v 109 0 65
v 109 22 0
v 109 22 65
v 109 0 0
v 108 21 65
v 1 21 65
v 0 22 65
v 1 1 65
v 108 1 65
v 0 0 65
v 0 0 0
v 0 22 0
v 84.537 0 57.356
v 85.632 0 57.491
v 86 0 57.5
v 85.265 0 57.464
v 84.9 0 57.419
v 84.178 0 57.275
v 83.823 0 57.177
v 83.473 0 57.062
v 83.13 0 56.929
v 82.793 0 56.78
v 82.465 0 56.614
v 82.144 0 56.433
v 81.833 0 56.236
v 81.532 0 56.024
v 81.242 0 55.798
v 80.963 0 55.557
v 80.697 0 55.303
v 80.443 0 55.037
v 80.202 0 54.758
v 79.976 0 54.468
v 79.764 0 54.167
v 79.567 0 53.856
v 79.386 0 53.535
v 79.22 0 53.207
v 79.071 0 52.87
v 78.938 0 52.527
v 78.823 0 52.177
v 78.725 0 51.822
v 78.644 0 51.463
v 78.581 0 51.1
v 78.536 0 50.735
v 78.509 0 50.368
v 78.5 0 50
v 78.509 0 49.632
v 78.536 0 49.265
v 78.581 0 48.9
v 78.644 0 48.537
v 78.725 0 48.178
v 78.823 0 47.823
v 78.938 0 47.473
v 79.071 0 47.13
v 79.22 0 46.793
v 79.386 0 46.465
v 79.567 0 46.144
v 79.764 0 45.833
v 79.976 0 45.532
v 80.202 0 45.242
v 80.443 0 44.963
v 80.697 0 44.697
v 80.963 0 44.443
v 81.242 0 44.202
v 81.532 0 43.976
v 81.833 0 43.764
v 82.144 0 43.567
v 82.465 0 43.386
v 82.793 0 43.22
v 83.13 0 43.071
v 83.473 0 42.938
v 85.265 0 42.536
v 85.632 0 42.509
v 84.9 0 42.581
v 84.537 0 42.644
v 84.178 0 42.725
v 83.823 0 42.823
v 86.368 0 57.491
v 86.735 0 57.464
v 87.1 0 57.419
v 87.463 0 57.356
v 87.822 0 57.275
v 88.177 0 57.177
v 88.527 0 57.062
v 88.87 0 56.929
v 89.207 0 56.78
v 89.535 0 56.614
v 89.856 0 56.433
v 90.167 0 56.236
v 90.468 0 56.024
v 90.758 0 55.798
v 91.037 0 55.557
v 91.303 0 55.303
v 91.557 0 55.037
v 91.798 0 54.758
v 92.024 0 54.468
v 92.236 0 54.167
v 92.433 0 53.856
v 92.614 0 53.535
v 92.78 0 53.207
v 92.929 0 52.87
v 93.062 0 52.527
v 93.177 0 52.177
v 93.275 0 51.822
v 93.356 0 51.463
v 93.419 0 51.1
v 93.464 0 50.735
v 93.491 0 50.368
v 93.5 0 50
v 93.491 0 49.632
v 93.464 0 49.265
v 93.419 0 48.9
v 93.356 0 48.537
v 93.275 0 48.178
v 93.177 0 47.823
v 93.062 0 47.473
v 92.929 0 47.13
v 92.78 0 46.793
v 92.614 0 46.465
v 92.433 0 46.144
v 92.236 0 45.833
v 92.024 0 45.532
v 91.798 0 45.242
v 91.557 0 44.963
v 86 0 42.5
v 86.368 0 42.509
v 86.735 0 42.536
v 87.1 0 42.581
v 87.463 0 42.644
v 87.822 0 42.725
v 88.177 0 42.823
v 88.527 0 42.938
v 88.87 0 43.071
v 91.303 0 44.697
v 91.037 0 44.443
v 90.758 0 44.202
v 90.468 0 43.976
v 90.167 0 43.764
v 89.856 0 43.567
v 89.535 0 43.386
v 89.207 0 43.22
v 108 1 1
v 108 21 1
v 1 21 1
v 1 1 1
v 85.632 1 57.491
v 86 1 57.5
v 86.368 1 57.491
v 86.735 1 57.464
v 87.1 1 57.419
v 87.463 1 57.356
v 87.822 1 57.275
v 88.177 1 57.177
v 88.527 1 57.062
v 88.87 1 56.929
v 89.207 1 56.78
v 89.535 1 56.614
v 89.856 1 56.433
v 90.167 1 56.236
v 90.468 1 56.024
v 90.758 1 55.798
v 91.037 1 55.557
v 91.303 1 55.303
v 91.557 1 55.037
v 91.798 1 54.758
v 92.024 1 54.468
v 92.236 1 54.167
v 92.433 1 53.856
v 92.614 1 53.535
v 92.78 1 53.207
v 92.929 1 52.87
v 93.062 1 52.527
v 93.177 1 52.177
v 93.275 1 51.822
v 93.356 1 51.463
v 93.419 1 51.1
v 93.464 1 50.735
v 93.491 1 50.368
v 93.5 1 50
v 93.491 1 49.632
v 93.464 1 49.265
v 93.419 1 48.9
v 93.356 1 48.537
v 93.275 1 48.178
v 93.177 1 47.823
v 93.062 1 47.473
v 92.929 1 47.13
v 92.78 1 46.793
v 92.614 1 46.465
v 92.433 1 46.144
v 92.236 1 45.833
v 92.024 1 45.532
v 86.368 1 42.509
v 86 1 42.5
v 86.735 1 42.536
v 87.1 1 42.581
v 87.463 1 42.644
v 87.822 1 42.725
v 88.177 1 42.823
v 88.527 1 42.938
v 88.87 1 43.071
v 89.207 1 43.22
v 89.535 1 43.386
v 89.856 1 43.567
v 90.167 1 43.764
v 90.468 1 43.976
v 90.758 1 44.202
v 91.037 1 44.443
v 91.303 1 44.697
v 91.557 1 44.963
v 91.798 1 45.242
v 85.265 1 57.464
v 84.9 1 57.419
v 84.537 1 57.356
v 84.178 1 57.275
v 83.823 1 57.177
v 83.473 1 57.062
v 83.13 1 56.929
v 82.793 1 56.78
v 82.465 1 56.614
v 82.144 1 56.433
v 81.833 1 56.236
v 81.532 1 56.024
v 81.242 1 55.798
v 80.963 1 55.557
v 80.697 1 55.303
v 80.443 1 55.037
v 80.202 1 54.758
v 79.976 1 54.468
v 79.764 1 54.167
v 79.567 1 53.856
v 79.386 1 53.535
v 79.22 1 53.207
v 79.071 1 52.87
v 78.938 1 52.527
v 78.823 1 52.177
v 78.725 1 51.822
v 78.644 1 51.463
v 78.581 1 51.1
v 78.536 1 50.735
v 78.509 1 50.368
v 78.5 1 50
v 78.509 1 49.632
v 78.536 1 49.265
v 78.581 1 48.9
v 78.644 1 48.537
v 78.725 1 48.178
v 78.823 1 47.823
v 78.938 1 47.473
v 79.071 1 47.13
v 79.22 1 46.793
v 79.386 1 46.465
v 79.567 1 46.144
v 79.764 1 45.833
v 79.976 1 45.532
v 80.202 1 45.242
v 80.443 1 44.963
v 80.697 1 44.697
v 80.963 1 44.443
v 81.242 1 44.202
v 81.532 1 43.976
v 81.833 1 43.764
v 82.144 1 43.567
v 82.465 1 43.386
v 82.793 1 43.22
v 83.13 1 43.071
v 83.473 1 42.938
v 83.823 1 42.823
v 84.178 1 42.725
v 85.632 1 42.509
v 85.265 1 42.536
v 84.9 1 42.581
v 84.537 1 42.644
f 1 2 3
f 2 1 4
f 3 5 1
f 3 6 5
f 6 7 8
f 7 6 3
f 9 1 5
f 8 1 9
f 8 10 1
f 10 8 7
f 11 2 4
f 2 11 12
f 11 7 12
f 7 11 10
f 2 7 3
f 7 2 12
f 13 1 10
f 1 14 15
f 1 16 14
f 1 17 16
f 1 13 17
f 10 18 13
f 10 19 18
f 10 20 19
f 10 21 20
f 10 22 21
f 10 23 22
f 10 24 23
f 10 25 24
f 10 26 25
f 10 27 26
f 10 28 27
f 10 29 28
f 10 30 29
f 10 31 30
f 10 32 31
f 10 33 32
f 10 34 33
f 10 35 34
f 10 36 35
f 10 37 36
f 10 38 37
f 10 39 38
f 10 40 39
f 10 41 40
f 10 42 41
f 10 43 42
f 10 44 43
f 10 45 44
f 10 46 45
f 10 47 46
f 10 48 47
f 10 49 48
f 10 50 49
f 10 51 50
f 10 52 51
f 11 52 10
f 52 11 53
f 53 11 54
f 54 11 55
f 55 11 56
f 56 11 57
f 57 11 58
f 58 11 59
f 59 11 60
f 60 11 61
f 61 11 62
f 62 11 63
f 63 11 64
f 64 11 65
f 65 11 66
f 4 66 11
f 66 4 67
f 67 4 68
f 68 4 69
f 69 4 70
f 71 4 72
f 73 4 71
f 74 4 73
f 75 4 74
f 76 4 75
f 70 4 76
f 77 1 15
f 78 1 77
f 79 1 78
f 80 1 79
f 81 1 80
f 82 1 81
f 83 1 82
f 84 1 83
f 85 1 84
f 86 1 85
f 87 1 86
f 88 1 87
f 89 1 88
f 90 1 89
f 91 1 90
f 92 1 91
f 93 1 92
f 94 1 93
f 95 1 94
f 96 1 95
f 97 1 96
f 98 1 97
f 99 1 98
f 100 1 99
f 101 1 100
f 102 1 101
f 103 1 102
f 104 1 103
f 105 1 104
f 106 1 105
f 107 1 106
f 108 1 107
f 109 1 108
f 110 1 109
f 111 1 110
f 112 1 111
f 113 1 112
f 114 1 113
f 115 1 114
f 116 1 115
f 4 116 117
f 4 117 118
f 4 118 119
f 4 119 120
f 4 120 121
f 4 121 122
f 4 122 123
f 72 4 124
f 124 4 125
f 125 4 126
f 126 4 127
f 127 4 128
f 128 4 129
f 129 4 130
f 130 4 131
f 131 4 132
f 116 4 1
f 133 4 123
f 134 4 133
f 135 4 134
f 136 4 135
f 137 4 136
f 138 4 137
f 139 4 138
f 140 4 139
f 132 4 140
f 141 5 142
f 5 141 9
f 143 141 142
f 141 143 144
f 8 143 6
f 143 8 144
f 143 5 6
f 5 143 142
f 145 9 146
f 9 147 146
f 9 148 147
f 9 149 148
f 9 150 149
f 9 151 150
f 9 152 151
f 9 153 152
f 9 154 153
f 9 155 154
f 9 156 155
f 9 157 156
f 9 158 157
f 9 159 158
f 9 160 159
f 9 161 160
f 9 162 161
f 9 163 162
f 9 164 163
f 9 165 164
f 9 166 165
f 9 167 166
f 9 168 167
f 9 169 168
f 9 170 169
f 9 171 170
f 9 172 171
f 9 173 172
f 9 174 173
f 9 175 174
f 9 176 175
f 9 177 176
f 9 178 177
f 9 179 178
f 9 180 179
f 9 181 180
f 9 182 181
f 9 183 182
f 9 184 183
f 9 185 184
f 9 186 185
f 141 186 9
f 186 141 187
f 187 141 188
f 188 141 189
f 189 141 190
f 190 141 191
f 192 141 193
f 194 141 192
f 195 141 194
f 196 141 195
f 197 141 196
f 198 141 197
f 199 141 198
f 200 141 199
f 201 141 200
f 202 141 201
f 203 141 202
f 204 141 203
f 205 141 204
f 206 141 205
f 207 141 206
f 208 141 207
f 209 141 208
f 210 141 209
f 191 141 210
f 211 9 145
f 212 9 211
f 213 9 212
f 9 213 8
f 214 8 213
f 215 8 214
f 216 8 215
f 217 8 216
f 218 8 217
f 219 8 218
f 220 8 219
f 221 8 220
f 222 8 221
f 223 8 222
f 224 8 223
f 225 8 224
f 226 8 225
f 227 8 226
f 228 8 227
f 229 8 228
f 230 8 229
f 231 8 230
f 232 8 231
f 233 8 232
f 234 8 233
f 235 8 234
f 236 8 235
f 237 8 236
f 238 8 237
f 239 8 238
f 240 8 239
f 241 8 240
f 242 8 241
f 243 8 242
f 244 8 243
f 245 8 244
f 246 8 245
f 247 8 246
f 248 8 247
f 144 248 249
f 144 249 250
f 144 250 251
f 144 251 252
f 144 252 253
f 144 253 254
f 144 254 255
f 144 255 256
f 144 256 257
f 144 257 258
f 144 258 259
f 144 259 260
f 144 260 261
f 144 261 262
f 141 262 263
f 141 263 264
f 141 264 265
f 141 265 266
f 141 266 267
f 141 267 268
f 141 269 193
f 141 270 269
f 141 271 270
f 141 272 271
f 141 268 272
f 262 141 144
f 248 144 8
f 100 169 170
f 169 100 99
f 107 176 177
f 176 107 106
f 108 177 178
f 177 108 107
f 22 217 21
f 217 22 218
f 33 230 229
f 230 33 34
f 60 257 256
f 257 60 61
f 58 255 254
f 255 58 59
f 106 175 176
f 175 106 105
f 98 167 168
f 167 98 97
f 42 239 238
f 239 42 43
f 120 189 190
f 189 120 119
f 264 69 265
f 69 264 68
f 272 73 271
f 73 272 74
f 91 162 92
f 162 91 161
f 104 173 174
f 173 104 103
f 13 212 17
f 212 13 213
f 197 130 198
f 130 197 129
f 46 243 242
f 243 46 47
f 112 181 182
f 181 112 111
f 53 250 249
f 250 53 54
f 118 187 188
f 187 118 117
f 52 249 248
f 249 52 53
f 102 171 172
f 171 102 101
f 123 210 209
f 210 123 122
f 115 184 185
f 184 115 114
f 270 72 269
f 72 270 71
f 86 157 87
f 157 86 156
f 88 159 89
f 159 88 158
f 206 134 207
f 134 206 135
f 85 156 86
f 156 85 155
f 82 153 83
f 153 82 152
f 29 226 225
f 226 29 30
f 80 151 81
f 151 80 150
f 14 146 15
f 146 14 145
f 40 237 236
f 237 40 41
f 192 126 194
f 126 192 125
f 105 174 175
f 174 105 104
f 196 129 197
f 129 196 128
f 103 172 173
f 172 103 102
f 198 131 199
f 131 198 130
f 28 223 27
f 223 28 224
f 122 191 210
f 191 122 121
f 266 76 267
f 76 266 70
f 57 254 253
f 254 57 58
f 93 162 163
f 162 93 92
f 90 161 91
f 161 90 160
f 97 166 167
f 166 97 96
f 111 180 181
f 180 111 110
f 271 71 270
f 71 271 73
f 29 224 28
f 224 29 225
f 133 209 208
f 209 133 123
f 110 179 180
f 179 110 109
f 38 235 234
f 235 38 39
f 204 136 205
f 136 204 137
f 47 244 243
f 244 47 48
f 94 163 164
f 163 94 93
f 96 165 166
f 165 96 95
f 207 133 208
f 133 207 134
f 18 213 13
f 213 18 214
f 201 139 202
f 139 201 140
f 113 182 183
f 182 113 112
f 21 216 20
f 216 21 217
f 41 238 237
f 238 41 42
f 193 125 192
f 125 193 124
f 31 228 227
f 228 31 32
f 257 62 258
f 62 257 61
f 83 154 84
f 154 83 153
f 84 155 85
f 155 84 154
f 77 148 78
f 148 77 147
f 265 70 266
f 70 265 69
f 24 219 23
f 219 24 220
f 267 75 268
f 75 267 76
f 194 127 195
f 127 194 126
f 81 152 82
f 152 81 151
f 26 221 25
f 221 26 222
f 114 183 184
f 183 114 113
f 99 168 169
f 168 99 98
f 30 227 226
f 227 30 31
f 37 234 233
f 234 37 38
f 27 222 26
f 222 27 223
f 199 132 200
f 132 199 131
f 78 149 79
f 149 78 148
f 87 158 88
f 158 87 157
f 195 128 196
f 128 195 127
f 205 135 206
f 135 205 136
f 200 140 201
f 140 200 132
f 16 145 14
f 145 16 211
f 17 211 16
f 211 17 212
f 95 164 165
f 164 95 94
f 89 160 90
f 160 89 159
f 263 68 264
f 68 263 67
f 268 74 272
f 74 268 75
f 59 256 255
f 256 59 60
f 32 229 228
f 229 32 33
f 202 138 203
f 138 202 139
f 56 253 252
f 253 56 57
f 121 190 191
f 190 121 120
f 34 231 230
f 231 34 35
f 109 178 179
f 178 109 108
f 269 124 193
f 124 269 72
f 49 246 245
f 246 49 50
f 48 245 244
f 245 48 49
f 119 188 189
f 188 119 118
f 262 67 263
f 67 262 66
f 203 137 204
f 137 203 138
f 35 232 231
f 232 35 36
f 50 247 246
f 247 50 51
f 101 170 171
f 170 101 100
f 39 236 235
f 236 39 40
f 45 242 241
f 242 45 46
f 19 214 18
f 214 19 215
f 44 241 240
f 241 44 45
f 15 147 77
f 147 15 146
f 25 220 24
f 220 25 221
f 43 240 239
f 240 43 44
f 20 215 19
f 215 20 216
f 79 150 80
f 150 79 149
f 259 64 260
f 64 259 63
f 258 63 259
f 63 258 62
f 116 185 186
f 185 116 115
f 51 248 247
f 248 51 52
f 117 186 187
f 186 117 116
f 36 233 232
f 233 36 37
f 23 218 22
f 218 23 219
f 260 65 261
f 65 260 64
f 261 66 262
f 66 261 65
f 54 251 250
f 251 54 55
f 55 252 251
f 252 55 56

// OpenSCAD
fn = 128;

thickness = 1;
gap = 10;
sample_x = 97 + gap;
sample_y = 20;
sample_z = 65;
aperture_radius = 15/2;
aperture_x_off = thickness + gap/2 + 80;
aperture_y_off = thickness*1.5;
aperture_z_off = 50;

module render() {
  difference() {
    difference() {
      cube(size = [sample_x+thickness*2,
                   sample_y+thickness*2, sample_z]);
      translate([thickness, thickness, thickness])
      cube(size = [sample_x, sample_y, sample_z]);
    }
    translate([aperture_x_off,
               aperture_y_off,
               aperture_z_off])
    rotate(a=90, v=[1, 0, 0])
    cylinder(h = thickness*3,
             r1 = aperture_radius,
             r2 = aperture_radius, $fn=fn);    
  }
}

echo(version=version());

render();
